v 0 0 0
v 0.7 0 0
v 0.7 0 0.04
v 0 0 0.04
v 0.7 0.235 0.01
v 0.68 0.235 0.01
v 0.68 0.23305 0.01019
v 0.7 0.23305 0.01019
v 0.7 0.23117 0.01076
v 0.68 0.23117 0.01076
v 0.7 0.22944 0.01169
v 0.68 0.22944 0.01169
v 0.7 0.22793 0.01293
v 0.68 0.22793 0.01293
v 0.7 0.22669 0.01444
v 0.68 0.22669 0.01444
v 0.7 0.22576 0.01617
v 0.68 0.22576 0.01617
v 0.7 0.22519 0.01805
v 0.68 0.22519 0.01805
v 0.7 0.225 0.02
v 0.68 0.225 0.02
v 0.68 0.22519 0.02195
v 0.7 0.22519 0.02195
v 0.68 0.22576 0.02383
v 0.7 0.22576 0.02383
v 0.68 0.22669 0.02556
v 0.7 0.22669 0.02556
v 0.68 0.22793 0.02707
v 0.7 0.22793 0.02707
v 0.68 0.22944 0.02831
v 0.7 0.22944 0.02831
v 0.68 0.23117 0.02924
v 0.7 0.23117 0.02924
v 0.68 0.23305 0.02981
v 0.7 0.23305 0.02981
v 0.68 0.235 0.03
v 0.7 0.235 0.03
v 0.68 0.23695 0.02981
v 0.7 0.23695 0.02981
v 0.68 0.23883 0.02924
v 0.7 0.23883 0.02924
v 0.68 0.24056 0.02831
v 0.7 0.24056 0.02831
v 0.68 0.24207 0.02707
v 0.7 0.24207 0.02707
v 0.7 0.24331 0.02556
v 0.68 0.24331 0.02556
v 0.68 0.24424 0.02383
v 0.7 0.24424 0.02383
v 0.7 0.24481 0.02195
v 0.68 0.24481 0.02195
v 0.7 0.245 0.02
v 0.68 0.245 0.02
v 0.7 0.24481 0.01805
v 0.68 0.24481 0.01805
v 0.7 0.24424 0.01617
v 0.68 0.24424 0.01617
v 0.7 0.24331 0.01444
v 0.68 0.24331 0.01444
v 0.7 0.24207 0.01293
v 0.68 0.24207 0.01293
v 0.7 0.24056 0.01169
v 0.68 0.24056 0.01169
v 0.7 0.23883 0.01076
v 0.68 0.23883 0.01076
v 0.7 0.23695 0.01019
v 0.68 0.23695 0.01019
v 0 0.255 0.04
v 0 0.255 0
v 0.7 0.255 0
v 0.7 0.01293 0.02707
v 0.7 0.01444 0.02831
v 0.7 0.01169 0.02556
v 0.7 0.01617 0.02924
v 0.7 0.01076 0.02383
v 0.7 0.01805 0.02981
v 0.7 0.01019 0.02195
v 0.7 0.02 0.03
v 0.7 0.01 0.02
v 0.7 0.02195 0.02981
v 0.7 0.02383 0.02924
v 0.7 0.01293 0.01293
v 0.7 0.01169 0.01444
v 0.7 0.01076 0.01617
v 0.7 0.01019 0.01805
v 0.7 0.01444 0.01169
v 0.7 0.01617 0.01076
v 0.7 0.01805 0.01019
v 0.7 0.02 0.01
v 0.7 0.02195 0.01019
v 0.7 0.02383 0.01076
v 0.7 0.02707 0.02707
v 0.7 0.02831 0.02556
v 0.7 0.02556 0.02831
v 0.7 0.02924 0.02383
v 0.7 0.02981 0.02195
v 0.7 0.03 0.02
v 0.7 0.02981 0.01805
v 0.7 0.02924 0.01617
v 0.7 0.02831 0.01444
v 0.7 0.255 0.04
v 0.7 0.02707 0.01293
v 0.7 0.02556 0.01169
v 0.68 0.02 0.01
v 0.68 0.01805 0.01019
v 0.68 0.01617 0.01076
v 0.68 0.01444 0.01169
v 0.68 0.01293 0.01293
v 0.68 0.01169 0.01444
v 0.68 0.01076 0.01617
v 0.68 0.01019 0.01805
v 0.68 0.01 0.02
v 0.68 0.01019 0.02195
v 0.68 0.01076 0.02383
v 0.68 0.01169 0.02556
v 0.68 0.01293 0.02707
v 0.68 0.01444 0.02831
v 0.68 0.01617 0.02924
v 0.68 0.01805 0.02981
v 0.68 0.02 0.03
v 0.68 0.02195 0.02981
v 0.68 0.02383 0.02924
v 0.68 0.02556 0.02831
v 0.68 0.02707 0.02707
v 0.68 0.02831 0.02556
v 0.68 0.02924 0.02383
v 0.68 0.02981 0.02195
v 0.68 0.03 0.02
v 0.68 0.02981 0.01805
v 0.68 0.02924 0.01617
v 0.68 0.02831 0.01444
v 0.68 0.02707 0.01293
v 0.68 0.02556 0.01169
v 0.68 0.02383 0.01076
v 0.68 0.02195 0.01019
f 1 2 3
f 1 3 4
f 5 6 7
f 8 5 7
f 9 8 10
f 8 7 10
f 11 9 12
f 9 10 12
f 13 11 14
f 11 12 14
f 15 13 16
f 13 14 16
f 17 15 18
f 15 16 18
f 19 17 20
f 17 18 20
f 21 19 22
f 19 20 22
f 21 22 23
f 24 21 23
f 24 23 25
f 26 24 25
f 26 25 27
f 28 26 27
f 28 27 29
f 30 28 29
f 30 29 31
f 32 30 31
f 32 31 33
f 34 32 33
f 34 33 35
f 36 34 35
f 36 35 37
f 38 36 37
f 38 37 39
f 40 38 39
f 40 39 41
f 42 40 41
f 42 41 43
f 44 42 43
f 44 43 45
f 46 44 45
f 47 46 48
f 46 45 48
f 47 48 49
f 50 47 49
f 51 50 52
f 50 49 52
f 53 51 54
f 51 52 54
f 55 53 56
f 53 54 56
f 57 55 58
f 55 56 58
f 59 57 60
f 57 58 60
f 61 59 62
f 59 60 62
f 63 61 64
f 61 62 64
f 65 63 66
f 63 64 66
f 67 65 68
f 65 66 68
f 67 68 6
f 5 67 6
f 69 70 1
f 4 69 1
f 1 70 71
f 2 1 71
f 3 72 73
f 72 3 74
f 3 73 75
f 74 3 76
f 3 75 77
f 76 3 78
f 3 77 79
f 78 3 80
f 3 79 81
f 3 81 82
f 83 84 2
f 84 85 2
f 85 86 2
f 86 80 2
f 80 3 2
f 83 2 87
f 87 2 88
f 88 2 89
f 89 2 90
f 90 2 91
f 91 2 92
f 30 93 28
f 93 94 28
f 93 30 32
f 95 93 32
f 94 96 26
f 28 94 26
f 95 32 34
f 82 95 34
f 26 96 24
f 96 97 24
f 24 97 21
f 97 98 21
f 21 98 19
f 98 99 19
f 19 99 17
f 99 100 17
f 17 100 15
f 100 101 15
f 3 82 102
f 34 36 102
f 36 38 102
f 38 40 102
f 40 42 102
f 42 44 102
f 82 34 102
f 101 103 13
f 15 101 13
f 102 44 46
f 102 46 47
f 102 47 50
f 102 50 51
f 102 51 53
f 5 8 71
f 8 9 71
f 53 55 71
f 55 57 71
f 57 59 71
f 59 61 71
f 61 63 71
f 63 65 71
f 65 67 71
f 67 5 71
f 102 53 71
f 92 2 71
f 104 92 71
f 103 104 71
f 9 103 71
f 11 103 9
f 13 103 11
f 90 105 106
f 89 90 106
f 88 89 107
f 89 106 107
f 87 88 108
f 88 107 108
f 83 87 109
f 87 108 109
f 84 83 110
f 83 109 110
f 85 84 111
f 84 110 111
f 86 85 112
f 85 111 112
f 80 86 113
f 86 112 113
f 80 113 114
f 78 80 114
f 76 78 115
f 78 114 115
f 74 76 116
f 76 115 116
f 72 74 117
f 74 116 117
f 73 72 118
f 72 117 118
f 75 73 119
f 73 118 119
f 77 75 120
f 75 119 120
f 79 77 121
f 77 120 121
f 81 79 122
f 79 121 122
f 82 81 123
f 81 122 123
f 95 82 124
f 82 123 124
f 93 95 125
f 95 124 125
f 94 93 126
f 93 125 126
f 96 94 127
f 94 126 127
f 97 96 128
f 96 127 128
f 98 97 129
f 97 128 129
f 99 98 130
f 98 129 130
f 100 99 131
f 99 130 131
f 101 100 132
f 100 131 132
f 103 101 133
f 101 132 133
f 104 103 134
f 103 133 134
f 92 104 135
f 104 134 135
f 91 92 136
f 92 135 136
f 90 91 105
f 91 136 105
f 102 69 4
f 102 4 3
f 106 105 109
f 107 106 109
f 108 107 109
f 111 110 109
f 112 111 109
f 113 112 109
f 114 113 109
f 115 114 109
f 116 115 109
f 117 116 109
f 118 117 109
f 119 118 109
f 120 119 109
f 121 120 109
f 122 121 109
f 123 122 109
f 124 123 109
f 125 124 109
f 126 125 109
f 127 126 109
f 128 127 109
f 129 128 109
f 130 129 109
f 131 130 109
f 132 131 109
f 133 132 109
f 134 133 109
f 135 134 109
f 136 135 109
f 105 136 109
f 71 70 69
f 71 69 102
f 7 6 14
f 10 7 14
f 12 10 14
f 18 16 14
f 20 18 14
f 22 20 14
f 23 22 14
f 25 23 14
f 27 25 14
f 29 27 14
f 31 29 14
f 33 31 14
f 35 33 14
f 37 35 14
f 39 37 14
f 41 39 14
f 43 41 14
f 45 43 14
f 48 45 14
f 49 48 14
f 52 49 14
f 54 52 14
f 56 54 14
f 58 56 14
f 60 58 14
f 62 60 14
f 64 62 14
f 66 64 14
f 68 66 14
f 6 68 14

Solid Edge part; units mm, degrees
sketch "Sketch1" plane through (0, 0, 0) normal (0, 0, 1) x (1, 0, 0)
  line L0 (0, 0.255) -> (0, 0)
  line L1 (0.7, 0) -> (0, 0)
  line L2 (0.7, 0) -> (0.7, 0.255)
  line L3 (0, 0.255) -> (0.7, 0.255)
  dimension "D1" = 0.04
extrude "Protrusion1" add sketch "Sketch1" along normal blind 0.04
hole "Bohrung_3" at (0.7, 0.02, 0.02) direction (-1, 0, 0) diameter 0.02 depth 0.02
hole "Hole1" at (0.7, 0.235, 0.02) direction (-1, 0, 0) diameter 0.02 depth 0.02
